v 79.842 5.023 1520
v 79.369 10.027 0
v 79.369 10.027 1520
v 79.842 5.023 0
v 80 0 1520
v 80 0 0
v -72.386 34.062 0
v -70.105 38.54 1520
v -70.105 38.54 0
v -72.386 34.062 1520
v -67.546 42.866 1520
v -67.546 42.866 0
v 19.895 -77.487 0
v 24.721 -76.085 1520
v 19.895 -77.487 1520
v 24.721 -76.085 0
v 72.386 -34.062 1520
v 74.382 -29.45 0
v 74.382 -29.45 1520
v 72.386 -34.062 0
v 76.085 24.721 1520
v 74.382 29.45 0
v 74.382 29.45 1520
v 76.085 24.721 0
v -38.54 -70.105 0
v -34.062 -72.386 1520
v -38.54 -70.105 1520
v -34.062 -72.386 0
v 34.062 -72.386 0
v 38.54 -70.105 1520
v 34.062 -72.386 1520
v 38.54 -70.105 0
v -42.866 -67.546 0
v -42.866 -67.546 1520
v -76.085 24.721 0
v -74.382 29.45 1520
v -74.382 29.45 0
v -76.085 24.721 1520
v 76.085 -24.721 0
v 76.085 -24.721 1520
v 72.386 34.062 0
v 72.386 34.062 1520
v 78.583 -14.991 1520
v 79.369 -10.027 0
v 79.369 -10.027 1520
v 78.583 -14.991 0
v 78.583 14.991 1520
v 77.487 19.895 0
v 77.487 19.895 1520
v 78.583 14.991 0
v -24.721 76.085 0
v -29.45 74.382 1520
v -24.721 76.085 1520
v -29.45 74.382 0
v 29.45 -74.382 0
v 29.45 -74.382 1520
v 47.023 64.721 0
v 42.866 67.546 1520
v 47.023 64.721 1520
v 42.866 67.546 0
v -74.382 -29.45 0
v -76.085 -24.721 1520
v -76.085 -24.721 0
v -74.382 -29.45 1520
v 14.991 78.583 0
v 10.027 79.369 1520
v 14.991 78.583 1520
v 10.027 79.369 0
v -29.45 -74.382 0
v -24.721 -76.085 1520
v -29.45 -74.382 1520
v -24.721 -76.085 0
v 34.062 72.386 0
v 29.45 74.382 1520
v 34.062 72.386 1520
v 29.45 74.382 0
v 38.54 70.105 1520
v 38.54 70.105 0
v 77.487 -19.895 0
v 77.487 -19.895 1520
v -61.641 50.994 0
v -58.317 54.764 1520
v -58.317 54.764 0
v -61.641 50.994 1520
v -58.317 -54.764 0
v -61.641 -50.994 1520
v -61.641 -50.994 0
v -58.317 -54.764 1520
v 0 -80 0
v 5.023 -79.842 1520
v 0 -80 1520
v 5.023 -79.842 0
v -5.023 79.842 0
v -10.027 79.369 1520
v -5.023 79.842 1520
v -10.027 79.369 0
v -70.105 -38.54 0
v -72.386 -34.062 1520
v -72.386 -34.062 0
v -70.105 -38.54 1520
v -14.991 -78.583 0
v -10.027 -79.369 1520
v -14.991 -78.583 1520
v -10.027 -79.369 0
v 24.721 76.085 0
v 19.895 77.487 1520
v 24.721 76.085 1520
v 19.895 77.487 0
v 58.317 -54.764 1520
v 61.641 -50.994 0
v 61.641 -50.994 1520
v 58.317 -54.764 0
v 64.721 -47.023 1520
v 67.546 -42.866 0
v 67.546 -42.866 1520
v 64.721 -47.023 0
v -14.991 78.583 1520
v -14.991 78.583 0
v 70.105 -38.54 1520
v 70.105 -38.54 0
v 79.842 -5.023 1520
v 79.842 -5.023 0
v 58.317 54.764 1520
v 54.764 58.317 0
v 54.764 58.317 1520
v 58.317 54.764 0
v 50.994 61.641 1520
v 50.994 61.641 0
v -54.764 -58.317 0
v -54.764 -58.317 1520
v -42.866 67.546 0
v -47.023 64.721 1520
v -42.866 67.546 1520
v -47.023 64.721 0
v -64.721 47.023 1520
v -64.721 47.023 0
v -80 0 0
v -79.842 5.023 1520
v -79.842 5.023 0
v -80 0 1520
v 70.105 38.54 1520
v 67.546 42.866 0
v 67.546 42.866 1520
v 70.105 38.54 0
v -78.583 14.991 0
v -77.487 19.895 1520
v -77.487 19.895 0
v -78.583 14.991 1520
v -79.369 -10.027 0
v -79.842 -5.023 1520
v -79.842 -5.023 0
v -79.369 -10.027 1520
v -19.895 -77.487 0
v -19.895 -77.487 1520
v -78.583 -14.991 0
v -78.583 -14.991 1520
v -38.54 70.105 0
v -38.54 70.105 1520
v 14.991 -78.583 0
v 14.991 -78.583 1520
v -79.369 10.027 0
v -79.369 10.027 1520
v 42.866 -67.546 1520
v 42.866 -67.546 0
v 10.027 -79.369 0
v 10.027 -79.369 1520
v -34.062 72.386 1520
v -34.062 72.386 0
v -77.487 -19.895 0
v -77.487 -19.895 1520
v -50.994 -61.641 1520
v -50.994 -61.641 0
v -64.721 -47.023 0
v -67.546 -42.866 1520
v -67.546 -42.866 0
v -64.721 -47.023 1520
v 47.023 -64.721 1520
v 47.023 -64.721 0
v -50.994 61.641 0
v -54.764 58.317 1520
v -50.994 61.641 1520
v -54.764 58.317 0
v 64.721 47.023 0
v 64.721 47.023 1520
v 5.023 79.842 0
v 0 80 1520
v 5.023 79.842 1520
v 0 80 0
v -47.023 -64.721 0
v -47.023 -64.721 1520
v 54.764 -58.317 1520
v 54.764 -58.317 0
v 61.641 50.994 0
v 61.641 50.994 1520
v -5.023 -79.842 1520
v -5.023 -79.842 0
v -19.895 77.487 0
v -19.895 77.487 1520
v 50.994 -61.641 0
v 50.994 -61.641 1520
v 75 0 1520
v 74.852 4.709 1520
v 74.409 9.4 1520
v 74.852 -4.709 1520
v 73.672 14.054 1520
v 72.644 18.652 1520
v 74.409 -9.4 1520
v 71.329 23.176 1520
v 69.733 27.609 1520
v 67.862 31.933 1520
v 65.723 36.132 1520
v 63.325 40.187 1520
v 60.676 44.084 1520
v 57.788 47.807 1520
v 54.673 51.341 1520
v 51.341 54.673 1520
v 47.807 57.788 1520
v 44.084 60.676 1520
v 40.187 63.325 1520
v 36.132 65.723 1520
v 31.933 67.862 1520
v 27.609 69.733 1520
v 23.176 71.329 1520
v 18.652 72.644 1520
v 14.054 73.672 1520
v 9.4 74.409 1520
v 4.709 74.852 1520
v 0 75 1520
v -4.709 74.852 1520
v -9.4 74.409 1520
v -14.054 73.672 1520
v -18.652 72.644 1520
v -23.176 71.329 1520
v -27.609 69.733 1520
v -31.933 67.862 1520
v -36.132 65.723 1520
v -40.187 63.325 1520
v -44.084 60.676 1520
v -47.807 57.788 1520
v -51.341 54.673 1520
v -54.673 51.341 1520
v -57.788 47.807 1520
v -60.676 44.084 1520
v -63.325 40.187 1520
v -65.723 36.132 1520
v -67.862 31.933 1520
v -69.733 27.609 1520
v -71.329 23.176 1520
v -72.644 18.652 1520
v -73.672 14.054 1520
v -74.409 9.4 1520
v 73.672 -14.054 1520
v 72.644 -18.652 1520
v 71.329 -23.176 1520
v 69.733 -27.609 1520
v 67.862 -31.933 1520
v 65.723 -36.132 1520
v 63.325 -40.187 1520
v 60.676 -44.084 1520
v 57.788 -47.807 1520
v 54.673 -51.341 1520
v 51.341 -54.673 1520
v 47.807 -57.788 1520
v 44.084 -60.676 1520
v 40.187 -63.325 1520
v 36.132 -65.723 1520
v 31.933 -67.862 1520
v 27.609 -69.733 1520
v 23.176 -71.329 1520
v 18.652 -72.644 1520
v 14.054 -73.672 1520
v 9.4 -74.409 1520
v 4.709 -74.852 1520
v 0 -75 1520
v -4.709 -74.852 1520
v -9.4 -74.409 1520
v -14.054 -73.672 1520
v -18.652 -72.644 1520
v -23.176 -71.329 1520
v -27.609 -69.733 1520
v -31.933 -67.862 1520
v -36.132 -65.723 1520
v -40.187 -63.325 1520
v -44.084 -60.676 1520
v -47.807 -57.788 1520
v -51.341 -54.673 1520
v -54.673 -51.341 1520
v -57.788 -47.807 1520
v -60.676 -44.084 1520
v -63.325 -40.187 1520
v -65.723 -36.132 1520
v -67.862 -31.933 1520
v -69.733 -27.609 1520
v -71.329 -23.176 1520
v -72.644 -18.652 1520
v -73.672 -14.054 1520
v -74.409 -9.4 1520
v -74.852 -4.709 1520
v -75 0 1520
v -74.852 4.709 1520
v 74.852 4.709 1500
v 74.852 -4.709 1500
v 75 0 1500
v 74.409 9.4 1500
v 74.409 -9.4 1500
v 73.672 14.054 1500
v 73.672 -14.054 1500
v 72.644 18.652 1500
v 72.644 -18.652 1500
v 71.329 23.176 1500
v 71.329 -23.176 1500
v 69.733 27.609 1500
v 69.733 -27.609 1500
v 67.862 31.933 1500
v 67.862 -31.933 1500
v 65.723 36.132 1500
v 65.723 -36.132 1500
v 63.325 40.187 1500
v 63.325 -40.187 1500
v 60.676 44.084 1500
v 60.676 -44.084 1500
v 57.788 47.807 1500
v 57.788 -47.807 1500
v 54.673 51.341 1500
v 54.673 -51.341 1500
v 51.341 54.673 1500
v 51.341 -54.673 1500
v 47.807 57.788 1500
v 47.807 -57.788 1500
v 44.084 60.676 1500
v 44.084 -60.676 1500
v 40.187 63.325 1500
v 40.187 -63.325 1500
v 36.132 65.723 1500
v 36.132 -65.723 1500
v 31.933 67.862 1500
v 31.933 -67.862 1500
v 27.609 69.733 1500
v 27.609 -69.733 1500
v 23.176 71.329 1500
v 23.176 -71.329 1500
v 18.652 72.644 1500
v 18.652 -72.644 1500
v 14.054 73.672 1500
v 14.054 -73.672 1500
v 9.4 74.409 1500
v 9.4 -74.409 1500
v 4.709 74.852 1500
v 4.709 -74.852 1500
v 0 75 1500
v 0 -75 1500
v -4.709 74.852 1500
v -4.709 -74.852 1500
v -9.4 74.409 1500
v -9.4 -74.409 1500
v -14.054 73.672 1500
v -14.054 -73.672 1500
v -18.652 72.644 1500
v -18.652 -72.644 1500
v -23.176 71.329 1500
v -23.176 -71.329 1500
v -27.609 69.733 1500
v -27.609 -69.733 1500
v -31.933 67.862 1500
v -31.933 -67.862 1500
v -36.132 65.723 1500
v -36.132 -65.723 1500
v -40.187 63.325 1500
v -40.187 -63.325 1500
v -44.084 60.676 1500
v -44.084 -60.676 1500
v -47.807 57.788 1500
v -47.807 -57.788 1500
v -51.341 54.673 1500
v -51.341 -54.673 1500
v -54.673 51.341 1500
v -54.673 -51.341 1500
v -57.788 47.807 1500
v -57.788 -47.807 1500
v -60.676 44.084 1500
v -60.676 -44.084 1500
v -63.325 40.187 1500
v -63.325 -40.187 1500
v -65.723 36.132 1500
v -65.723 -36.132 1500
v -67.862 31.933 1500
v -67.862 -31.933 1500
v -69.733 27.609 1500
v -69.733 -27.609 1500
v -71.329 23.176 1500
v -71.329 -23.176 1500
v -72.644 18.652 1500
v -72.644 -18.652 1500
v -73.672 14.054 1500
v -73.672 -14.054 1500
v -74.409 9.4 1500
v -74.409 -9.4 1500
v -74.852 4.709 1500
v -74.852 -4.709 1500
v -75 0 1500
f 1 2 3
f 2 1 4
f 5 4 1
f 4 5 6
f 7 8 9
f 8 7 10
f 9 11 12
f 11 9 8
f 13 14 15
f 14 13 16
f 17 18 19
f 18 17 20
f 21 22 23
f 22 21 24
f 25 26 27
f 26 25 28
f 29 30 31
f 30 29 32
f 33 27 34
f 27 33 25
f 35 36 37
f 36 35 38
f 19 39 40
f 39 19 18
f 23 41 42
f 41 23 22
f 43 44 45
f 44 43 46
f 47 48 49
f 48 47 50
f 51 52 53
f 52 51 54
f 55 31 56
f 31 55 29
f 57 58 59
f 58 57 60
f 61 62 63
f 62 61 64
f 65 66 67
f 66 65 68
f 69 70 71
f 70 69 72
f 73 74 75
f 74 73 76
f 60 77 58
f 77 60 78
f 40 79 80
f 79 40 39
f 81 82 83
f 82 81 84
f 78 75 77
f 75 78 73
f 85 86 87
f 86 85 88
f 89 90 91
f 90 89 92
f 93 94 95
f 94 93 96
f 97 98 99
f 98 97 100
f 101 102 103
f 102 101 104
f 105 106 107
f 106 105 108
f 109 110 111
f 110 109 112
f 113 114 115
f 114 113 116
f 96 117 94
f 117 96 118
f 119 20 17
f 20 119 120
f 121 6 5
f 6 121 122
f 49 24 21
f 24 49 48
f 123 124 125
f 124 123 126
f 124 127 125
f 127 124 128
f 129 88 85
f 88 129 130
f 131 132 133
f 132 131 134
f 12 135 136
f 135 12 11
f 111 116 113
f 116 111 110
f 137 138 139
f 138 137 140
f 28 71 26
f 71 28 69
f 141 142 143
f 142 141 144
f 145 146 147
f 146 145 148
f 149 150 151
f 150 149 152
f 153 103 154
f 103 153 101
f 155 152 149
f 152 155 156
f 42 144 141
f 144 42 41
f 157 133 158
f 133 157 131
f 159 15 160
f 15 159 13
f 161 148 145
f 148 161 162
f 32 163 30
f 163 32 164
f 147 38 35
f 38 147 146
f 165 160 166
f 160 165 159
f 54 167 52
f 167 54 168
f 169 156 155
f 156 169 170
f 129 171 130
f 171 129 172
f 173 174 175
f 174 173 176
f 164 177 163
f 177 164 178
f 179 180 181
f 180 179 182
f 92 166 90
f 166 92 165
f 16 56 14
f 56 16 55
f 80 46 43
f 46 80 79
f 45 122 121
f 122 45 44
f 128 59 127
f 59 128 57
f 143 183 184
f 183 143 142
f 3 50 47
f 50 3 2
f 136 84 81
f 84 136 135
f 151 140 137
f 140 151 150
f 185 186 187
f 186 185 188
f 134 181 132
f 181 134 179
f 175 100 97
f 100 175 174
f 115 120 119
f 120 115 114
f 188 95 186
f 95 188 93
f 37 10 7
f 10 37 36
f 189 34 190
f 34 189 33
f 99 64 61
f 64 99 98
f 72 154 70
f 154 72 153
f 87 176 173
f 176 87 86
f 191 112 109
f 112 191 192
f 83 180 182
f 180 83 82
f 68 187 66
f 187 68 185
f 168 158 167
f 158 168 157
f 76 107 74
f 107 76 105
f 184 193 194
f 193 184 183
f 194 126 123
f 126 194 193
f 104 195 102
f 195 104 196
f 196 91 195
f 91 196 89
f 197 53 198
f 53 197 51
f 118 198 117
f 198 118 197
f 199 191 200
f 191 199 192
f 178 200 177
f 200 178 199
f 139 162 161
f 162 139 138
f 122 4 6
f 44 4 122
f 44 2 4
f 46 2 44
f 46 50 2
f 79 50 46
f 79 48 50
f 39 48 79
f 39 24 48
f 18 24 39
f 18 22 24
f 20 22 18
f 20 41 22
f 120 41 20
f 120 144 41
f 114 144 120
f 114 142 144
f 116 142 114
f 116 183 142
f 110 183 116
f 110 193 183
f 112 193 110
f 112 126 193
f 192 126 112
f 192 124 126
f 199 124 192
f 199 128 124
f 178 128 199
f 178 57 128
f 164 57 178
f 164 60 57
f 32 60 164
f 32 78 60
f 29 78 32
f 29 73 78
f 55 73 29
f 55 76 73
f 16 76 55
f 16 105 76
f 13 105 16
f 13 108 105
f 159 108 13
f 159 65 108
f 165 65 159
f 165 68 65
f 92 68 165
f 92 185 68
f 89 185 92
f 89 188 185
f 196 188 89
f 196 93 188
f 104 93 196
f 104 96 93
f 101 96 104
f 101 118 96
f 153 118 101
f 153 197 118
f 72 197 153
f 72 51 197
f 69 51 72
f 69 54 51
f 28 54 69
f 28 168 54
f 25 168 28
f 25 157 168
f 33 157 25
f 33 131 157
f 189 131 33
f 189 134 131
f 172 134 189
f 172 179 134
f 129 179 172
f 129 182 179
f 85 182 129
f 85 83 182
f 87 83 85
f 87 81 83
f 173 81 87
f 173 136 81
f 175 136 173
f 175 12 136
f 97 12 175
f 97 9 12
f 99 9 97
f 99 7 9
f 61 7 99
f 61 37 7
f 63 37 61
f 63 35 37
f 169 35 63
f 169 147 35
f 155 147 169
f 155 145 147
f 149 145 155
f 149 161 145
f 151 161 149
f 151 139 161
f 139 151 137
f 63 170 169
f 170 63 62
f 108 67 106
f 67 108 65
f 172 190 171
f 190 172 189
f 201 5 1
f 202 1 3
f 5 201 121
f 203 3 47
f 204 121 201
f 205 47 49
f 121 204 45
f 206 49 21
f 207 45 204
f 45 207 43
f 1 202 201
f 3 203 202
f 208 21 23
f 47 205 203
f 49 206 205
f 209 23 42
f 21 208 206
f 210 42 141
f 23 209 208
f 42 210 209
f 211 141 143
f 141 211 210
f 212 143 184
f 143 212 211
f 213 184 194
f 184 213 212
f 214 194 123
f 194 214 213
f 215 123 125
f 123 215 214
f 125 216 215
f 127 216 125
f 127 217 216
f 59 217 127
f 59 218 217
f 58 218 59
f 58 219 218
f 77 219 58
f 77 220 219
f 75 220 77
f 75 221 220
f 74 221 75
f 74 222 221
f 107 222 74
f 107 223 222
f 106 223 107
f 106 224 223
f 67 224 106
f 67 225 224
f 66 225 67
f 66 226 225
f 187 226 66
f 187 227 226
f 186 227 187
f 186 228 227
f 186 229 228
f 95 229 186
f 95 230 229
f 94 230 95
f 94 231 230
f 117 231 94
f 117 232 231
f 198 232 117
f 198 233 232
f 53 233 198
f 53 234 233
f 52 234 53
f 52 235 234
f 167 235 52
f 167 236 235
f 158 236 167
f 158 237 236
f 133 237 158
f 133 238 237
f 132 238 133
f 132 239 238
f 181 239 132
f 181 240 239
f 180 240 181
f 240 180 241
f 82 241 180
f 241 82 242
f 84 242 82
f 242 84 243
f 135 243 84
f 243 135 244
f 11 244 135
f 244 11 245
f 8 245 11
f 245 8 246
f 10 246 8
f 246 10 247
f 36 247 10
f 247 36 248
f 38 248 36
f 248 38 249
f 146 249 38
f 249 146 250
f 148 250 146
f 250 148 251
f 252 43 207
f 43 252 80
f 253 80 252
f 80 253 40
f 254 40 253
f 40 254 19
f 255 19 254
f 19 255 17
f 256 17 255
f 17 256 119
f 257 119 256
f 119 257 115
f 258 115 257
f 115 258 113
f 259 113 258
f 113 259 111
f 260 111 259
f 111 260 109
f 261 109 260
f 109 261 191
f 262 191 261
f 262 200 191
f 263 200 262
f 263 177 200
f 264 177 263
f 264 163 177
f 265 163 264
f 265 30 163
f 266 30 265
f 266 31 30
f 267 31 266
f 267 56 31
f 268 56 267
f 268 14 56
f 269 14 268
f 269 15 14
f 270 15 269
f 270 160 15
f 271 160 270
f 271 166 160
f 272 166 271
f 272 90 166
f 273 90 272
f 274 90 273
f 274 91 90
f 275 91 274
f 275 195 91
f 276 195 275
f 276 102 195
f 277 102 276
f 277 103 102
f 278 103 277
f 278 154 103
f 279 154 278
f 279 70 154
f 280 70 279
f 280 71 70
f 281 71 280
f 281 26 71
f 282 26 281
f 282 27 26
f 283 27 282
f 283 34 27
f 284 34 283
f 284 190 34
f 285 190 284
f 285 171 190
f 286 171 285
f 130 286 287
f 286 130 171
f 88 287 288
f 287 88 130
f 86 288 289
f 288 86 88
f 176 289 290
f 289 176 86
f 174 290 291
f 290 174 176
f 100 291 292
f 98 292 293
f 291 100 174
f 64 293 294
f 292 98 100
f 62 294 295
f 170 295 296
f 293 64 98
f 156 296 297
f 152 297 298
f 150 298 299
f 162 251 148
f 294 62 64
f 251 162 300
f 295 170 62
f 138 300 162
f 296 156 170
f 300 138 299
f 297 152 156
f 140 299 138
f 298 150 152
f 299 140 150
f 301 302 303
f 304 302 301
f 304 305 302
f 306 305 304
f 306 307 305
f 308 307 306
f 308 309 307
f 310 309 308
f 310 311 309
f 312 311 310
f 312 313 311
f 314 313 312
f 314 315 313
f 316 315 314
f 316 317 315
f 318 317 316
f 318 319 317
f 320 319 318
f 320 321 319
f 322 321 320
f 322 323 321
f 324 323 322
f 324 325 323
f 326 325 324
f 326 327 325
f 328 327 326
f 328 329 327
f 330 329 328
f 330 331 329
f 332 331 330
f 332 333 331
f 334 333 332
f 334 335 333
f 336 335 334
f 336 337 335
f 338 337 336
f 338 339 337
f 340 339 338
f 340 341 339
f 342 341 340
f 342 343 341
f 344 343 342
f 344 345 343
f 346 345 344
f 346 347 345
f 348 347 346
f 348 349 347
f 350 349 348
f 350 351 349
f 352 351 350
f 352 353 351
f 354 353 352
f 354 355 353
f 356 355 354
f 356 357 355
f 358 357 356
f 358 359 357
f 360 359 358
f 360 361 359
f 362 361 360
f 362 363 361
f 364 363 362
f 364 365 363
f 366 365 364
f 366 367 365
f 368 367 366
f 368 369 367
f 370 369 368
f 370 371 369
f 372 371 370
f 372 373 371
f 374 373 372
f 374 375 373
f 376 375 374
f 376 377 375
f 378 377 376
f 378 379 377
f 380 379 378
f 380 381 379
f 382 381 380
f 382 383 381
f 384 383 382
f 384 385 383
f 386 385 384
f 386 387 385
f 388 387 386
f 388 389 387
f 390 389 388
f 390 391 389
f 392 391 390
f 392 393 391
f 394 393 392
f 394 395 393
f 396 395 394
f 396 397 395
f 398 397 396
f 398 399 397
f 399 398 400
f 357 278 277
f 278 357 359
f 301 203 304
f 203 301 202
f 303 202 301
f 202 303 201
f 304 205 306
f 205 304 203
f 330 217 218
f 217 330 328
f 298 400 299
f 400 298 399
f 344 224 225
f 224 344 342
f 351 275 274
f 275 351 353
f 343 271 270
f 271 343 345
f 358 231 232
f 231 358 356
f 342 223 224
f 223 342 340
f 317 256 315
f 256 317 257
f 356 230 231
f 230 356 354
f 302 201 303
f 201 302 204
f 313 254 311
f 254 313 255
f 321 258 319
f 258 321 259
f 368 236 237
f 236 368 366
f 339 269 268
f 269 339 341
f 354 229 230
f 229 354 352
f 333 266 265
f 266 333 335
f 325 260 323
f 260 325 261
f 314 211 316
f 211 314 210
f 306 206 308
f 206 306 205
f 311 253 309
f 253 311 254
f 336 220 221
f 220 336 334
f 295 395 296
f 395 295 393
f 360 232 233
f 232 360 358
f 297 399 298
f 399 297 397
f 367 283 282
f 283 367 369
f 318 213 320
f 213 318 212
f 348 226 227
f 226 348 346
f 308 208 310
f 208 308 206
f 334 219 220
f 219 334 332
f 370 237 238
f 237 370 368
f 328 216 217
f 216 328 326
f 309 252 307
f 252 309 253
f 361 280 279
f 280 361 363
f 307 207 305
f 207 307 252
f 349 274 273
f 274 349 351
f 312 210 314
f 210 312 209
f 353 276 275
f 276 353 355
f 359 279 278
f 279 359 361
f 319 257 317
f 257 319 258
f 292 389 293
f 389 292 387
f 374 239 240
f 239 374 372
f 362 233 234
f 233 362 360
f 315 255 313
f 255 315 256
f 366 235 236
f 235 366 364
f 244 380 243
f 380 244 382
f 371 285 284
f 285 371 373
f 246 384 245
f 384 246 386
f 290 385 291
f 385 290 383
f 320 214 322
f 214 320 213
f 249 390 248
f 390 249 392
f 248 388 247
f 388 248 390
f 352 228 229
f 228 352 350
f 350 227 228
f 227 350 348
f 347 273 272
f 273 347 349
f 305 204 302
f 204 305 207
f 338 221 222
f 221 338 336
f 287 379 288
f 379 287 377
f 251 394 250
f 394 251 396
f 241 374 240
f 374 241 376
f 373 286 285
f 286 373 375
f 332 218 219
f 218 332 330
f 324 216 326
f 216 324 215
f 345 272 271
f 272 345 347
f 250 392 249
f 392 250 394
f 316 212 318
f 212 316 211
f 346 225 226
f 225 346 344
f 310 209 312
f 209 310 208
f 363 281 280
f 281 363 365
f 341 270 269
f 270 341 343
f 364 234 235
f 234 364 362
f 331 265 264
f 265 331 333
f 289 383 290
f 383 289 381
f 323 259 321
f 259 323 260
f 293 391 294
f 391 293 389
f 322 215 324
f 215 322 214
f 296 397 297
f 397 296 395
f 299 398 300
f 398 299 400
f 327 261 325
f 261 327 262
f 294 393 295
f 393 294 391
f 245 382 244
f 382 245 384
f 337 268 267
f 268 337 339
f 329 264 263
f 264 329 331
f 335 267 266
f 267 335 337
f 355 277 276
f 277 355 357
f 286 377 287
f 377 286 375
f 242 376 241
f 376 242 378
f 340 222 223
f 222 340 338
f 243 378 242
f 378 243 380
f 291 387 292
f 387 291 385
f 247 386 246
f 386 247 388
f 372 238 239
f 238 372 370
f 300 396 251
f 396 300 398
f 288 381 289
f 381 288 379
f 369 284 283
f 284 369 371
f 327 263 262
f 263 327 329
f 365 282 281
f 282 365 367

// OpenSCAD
// Define the HT pipe vitamin component
module ht_pipe_body(diameter, length) {
    cylinder(h=length, d=diameter, $fn=100);
}

module pipe_end_fitting_geometry(diameter, thickness) {
    difference() {
        cylinder(h=thickness, d=diameter, $fn=100);
        translate([0, 0, -1])
            cylinder(h=thickness + 2, d=diameter - 10, $fn=100);
    }
}

module ht_pipe(diameter, length, end_thickness) {
    union() {
        ht_pipe_body(diameter, length);
        translate([0, 0, length])
            pipe_end_fitting_geometry(diameter, end_thickness);
        pipe_end_fitting_geometry(diameter, end_thickness);
    }
}

// Parameters for HT 160 pipe
ht_pipe_diameter = 160;
ht_pipe_length = 1500;
end_fitting_thickness = 20;

// Create the HT pipe model
ht_pipe(ht_pipe_diameter, ht_pipe_length, end_fitting_thickness);
